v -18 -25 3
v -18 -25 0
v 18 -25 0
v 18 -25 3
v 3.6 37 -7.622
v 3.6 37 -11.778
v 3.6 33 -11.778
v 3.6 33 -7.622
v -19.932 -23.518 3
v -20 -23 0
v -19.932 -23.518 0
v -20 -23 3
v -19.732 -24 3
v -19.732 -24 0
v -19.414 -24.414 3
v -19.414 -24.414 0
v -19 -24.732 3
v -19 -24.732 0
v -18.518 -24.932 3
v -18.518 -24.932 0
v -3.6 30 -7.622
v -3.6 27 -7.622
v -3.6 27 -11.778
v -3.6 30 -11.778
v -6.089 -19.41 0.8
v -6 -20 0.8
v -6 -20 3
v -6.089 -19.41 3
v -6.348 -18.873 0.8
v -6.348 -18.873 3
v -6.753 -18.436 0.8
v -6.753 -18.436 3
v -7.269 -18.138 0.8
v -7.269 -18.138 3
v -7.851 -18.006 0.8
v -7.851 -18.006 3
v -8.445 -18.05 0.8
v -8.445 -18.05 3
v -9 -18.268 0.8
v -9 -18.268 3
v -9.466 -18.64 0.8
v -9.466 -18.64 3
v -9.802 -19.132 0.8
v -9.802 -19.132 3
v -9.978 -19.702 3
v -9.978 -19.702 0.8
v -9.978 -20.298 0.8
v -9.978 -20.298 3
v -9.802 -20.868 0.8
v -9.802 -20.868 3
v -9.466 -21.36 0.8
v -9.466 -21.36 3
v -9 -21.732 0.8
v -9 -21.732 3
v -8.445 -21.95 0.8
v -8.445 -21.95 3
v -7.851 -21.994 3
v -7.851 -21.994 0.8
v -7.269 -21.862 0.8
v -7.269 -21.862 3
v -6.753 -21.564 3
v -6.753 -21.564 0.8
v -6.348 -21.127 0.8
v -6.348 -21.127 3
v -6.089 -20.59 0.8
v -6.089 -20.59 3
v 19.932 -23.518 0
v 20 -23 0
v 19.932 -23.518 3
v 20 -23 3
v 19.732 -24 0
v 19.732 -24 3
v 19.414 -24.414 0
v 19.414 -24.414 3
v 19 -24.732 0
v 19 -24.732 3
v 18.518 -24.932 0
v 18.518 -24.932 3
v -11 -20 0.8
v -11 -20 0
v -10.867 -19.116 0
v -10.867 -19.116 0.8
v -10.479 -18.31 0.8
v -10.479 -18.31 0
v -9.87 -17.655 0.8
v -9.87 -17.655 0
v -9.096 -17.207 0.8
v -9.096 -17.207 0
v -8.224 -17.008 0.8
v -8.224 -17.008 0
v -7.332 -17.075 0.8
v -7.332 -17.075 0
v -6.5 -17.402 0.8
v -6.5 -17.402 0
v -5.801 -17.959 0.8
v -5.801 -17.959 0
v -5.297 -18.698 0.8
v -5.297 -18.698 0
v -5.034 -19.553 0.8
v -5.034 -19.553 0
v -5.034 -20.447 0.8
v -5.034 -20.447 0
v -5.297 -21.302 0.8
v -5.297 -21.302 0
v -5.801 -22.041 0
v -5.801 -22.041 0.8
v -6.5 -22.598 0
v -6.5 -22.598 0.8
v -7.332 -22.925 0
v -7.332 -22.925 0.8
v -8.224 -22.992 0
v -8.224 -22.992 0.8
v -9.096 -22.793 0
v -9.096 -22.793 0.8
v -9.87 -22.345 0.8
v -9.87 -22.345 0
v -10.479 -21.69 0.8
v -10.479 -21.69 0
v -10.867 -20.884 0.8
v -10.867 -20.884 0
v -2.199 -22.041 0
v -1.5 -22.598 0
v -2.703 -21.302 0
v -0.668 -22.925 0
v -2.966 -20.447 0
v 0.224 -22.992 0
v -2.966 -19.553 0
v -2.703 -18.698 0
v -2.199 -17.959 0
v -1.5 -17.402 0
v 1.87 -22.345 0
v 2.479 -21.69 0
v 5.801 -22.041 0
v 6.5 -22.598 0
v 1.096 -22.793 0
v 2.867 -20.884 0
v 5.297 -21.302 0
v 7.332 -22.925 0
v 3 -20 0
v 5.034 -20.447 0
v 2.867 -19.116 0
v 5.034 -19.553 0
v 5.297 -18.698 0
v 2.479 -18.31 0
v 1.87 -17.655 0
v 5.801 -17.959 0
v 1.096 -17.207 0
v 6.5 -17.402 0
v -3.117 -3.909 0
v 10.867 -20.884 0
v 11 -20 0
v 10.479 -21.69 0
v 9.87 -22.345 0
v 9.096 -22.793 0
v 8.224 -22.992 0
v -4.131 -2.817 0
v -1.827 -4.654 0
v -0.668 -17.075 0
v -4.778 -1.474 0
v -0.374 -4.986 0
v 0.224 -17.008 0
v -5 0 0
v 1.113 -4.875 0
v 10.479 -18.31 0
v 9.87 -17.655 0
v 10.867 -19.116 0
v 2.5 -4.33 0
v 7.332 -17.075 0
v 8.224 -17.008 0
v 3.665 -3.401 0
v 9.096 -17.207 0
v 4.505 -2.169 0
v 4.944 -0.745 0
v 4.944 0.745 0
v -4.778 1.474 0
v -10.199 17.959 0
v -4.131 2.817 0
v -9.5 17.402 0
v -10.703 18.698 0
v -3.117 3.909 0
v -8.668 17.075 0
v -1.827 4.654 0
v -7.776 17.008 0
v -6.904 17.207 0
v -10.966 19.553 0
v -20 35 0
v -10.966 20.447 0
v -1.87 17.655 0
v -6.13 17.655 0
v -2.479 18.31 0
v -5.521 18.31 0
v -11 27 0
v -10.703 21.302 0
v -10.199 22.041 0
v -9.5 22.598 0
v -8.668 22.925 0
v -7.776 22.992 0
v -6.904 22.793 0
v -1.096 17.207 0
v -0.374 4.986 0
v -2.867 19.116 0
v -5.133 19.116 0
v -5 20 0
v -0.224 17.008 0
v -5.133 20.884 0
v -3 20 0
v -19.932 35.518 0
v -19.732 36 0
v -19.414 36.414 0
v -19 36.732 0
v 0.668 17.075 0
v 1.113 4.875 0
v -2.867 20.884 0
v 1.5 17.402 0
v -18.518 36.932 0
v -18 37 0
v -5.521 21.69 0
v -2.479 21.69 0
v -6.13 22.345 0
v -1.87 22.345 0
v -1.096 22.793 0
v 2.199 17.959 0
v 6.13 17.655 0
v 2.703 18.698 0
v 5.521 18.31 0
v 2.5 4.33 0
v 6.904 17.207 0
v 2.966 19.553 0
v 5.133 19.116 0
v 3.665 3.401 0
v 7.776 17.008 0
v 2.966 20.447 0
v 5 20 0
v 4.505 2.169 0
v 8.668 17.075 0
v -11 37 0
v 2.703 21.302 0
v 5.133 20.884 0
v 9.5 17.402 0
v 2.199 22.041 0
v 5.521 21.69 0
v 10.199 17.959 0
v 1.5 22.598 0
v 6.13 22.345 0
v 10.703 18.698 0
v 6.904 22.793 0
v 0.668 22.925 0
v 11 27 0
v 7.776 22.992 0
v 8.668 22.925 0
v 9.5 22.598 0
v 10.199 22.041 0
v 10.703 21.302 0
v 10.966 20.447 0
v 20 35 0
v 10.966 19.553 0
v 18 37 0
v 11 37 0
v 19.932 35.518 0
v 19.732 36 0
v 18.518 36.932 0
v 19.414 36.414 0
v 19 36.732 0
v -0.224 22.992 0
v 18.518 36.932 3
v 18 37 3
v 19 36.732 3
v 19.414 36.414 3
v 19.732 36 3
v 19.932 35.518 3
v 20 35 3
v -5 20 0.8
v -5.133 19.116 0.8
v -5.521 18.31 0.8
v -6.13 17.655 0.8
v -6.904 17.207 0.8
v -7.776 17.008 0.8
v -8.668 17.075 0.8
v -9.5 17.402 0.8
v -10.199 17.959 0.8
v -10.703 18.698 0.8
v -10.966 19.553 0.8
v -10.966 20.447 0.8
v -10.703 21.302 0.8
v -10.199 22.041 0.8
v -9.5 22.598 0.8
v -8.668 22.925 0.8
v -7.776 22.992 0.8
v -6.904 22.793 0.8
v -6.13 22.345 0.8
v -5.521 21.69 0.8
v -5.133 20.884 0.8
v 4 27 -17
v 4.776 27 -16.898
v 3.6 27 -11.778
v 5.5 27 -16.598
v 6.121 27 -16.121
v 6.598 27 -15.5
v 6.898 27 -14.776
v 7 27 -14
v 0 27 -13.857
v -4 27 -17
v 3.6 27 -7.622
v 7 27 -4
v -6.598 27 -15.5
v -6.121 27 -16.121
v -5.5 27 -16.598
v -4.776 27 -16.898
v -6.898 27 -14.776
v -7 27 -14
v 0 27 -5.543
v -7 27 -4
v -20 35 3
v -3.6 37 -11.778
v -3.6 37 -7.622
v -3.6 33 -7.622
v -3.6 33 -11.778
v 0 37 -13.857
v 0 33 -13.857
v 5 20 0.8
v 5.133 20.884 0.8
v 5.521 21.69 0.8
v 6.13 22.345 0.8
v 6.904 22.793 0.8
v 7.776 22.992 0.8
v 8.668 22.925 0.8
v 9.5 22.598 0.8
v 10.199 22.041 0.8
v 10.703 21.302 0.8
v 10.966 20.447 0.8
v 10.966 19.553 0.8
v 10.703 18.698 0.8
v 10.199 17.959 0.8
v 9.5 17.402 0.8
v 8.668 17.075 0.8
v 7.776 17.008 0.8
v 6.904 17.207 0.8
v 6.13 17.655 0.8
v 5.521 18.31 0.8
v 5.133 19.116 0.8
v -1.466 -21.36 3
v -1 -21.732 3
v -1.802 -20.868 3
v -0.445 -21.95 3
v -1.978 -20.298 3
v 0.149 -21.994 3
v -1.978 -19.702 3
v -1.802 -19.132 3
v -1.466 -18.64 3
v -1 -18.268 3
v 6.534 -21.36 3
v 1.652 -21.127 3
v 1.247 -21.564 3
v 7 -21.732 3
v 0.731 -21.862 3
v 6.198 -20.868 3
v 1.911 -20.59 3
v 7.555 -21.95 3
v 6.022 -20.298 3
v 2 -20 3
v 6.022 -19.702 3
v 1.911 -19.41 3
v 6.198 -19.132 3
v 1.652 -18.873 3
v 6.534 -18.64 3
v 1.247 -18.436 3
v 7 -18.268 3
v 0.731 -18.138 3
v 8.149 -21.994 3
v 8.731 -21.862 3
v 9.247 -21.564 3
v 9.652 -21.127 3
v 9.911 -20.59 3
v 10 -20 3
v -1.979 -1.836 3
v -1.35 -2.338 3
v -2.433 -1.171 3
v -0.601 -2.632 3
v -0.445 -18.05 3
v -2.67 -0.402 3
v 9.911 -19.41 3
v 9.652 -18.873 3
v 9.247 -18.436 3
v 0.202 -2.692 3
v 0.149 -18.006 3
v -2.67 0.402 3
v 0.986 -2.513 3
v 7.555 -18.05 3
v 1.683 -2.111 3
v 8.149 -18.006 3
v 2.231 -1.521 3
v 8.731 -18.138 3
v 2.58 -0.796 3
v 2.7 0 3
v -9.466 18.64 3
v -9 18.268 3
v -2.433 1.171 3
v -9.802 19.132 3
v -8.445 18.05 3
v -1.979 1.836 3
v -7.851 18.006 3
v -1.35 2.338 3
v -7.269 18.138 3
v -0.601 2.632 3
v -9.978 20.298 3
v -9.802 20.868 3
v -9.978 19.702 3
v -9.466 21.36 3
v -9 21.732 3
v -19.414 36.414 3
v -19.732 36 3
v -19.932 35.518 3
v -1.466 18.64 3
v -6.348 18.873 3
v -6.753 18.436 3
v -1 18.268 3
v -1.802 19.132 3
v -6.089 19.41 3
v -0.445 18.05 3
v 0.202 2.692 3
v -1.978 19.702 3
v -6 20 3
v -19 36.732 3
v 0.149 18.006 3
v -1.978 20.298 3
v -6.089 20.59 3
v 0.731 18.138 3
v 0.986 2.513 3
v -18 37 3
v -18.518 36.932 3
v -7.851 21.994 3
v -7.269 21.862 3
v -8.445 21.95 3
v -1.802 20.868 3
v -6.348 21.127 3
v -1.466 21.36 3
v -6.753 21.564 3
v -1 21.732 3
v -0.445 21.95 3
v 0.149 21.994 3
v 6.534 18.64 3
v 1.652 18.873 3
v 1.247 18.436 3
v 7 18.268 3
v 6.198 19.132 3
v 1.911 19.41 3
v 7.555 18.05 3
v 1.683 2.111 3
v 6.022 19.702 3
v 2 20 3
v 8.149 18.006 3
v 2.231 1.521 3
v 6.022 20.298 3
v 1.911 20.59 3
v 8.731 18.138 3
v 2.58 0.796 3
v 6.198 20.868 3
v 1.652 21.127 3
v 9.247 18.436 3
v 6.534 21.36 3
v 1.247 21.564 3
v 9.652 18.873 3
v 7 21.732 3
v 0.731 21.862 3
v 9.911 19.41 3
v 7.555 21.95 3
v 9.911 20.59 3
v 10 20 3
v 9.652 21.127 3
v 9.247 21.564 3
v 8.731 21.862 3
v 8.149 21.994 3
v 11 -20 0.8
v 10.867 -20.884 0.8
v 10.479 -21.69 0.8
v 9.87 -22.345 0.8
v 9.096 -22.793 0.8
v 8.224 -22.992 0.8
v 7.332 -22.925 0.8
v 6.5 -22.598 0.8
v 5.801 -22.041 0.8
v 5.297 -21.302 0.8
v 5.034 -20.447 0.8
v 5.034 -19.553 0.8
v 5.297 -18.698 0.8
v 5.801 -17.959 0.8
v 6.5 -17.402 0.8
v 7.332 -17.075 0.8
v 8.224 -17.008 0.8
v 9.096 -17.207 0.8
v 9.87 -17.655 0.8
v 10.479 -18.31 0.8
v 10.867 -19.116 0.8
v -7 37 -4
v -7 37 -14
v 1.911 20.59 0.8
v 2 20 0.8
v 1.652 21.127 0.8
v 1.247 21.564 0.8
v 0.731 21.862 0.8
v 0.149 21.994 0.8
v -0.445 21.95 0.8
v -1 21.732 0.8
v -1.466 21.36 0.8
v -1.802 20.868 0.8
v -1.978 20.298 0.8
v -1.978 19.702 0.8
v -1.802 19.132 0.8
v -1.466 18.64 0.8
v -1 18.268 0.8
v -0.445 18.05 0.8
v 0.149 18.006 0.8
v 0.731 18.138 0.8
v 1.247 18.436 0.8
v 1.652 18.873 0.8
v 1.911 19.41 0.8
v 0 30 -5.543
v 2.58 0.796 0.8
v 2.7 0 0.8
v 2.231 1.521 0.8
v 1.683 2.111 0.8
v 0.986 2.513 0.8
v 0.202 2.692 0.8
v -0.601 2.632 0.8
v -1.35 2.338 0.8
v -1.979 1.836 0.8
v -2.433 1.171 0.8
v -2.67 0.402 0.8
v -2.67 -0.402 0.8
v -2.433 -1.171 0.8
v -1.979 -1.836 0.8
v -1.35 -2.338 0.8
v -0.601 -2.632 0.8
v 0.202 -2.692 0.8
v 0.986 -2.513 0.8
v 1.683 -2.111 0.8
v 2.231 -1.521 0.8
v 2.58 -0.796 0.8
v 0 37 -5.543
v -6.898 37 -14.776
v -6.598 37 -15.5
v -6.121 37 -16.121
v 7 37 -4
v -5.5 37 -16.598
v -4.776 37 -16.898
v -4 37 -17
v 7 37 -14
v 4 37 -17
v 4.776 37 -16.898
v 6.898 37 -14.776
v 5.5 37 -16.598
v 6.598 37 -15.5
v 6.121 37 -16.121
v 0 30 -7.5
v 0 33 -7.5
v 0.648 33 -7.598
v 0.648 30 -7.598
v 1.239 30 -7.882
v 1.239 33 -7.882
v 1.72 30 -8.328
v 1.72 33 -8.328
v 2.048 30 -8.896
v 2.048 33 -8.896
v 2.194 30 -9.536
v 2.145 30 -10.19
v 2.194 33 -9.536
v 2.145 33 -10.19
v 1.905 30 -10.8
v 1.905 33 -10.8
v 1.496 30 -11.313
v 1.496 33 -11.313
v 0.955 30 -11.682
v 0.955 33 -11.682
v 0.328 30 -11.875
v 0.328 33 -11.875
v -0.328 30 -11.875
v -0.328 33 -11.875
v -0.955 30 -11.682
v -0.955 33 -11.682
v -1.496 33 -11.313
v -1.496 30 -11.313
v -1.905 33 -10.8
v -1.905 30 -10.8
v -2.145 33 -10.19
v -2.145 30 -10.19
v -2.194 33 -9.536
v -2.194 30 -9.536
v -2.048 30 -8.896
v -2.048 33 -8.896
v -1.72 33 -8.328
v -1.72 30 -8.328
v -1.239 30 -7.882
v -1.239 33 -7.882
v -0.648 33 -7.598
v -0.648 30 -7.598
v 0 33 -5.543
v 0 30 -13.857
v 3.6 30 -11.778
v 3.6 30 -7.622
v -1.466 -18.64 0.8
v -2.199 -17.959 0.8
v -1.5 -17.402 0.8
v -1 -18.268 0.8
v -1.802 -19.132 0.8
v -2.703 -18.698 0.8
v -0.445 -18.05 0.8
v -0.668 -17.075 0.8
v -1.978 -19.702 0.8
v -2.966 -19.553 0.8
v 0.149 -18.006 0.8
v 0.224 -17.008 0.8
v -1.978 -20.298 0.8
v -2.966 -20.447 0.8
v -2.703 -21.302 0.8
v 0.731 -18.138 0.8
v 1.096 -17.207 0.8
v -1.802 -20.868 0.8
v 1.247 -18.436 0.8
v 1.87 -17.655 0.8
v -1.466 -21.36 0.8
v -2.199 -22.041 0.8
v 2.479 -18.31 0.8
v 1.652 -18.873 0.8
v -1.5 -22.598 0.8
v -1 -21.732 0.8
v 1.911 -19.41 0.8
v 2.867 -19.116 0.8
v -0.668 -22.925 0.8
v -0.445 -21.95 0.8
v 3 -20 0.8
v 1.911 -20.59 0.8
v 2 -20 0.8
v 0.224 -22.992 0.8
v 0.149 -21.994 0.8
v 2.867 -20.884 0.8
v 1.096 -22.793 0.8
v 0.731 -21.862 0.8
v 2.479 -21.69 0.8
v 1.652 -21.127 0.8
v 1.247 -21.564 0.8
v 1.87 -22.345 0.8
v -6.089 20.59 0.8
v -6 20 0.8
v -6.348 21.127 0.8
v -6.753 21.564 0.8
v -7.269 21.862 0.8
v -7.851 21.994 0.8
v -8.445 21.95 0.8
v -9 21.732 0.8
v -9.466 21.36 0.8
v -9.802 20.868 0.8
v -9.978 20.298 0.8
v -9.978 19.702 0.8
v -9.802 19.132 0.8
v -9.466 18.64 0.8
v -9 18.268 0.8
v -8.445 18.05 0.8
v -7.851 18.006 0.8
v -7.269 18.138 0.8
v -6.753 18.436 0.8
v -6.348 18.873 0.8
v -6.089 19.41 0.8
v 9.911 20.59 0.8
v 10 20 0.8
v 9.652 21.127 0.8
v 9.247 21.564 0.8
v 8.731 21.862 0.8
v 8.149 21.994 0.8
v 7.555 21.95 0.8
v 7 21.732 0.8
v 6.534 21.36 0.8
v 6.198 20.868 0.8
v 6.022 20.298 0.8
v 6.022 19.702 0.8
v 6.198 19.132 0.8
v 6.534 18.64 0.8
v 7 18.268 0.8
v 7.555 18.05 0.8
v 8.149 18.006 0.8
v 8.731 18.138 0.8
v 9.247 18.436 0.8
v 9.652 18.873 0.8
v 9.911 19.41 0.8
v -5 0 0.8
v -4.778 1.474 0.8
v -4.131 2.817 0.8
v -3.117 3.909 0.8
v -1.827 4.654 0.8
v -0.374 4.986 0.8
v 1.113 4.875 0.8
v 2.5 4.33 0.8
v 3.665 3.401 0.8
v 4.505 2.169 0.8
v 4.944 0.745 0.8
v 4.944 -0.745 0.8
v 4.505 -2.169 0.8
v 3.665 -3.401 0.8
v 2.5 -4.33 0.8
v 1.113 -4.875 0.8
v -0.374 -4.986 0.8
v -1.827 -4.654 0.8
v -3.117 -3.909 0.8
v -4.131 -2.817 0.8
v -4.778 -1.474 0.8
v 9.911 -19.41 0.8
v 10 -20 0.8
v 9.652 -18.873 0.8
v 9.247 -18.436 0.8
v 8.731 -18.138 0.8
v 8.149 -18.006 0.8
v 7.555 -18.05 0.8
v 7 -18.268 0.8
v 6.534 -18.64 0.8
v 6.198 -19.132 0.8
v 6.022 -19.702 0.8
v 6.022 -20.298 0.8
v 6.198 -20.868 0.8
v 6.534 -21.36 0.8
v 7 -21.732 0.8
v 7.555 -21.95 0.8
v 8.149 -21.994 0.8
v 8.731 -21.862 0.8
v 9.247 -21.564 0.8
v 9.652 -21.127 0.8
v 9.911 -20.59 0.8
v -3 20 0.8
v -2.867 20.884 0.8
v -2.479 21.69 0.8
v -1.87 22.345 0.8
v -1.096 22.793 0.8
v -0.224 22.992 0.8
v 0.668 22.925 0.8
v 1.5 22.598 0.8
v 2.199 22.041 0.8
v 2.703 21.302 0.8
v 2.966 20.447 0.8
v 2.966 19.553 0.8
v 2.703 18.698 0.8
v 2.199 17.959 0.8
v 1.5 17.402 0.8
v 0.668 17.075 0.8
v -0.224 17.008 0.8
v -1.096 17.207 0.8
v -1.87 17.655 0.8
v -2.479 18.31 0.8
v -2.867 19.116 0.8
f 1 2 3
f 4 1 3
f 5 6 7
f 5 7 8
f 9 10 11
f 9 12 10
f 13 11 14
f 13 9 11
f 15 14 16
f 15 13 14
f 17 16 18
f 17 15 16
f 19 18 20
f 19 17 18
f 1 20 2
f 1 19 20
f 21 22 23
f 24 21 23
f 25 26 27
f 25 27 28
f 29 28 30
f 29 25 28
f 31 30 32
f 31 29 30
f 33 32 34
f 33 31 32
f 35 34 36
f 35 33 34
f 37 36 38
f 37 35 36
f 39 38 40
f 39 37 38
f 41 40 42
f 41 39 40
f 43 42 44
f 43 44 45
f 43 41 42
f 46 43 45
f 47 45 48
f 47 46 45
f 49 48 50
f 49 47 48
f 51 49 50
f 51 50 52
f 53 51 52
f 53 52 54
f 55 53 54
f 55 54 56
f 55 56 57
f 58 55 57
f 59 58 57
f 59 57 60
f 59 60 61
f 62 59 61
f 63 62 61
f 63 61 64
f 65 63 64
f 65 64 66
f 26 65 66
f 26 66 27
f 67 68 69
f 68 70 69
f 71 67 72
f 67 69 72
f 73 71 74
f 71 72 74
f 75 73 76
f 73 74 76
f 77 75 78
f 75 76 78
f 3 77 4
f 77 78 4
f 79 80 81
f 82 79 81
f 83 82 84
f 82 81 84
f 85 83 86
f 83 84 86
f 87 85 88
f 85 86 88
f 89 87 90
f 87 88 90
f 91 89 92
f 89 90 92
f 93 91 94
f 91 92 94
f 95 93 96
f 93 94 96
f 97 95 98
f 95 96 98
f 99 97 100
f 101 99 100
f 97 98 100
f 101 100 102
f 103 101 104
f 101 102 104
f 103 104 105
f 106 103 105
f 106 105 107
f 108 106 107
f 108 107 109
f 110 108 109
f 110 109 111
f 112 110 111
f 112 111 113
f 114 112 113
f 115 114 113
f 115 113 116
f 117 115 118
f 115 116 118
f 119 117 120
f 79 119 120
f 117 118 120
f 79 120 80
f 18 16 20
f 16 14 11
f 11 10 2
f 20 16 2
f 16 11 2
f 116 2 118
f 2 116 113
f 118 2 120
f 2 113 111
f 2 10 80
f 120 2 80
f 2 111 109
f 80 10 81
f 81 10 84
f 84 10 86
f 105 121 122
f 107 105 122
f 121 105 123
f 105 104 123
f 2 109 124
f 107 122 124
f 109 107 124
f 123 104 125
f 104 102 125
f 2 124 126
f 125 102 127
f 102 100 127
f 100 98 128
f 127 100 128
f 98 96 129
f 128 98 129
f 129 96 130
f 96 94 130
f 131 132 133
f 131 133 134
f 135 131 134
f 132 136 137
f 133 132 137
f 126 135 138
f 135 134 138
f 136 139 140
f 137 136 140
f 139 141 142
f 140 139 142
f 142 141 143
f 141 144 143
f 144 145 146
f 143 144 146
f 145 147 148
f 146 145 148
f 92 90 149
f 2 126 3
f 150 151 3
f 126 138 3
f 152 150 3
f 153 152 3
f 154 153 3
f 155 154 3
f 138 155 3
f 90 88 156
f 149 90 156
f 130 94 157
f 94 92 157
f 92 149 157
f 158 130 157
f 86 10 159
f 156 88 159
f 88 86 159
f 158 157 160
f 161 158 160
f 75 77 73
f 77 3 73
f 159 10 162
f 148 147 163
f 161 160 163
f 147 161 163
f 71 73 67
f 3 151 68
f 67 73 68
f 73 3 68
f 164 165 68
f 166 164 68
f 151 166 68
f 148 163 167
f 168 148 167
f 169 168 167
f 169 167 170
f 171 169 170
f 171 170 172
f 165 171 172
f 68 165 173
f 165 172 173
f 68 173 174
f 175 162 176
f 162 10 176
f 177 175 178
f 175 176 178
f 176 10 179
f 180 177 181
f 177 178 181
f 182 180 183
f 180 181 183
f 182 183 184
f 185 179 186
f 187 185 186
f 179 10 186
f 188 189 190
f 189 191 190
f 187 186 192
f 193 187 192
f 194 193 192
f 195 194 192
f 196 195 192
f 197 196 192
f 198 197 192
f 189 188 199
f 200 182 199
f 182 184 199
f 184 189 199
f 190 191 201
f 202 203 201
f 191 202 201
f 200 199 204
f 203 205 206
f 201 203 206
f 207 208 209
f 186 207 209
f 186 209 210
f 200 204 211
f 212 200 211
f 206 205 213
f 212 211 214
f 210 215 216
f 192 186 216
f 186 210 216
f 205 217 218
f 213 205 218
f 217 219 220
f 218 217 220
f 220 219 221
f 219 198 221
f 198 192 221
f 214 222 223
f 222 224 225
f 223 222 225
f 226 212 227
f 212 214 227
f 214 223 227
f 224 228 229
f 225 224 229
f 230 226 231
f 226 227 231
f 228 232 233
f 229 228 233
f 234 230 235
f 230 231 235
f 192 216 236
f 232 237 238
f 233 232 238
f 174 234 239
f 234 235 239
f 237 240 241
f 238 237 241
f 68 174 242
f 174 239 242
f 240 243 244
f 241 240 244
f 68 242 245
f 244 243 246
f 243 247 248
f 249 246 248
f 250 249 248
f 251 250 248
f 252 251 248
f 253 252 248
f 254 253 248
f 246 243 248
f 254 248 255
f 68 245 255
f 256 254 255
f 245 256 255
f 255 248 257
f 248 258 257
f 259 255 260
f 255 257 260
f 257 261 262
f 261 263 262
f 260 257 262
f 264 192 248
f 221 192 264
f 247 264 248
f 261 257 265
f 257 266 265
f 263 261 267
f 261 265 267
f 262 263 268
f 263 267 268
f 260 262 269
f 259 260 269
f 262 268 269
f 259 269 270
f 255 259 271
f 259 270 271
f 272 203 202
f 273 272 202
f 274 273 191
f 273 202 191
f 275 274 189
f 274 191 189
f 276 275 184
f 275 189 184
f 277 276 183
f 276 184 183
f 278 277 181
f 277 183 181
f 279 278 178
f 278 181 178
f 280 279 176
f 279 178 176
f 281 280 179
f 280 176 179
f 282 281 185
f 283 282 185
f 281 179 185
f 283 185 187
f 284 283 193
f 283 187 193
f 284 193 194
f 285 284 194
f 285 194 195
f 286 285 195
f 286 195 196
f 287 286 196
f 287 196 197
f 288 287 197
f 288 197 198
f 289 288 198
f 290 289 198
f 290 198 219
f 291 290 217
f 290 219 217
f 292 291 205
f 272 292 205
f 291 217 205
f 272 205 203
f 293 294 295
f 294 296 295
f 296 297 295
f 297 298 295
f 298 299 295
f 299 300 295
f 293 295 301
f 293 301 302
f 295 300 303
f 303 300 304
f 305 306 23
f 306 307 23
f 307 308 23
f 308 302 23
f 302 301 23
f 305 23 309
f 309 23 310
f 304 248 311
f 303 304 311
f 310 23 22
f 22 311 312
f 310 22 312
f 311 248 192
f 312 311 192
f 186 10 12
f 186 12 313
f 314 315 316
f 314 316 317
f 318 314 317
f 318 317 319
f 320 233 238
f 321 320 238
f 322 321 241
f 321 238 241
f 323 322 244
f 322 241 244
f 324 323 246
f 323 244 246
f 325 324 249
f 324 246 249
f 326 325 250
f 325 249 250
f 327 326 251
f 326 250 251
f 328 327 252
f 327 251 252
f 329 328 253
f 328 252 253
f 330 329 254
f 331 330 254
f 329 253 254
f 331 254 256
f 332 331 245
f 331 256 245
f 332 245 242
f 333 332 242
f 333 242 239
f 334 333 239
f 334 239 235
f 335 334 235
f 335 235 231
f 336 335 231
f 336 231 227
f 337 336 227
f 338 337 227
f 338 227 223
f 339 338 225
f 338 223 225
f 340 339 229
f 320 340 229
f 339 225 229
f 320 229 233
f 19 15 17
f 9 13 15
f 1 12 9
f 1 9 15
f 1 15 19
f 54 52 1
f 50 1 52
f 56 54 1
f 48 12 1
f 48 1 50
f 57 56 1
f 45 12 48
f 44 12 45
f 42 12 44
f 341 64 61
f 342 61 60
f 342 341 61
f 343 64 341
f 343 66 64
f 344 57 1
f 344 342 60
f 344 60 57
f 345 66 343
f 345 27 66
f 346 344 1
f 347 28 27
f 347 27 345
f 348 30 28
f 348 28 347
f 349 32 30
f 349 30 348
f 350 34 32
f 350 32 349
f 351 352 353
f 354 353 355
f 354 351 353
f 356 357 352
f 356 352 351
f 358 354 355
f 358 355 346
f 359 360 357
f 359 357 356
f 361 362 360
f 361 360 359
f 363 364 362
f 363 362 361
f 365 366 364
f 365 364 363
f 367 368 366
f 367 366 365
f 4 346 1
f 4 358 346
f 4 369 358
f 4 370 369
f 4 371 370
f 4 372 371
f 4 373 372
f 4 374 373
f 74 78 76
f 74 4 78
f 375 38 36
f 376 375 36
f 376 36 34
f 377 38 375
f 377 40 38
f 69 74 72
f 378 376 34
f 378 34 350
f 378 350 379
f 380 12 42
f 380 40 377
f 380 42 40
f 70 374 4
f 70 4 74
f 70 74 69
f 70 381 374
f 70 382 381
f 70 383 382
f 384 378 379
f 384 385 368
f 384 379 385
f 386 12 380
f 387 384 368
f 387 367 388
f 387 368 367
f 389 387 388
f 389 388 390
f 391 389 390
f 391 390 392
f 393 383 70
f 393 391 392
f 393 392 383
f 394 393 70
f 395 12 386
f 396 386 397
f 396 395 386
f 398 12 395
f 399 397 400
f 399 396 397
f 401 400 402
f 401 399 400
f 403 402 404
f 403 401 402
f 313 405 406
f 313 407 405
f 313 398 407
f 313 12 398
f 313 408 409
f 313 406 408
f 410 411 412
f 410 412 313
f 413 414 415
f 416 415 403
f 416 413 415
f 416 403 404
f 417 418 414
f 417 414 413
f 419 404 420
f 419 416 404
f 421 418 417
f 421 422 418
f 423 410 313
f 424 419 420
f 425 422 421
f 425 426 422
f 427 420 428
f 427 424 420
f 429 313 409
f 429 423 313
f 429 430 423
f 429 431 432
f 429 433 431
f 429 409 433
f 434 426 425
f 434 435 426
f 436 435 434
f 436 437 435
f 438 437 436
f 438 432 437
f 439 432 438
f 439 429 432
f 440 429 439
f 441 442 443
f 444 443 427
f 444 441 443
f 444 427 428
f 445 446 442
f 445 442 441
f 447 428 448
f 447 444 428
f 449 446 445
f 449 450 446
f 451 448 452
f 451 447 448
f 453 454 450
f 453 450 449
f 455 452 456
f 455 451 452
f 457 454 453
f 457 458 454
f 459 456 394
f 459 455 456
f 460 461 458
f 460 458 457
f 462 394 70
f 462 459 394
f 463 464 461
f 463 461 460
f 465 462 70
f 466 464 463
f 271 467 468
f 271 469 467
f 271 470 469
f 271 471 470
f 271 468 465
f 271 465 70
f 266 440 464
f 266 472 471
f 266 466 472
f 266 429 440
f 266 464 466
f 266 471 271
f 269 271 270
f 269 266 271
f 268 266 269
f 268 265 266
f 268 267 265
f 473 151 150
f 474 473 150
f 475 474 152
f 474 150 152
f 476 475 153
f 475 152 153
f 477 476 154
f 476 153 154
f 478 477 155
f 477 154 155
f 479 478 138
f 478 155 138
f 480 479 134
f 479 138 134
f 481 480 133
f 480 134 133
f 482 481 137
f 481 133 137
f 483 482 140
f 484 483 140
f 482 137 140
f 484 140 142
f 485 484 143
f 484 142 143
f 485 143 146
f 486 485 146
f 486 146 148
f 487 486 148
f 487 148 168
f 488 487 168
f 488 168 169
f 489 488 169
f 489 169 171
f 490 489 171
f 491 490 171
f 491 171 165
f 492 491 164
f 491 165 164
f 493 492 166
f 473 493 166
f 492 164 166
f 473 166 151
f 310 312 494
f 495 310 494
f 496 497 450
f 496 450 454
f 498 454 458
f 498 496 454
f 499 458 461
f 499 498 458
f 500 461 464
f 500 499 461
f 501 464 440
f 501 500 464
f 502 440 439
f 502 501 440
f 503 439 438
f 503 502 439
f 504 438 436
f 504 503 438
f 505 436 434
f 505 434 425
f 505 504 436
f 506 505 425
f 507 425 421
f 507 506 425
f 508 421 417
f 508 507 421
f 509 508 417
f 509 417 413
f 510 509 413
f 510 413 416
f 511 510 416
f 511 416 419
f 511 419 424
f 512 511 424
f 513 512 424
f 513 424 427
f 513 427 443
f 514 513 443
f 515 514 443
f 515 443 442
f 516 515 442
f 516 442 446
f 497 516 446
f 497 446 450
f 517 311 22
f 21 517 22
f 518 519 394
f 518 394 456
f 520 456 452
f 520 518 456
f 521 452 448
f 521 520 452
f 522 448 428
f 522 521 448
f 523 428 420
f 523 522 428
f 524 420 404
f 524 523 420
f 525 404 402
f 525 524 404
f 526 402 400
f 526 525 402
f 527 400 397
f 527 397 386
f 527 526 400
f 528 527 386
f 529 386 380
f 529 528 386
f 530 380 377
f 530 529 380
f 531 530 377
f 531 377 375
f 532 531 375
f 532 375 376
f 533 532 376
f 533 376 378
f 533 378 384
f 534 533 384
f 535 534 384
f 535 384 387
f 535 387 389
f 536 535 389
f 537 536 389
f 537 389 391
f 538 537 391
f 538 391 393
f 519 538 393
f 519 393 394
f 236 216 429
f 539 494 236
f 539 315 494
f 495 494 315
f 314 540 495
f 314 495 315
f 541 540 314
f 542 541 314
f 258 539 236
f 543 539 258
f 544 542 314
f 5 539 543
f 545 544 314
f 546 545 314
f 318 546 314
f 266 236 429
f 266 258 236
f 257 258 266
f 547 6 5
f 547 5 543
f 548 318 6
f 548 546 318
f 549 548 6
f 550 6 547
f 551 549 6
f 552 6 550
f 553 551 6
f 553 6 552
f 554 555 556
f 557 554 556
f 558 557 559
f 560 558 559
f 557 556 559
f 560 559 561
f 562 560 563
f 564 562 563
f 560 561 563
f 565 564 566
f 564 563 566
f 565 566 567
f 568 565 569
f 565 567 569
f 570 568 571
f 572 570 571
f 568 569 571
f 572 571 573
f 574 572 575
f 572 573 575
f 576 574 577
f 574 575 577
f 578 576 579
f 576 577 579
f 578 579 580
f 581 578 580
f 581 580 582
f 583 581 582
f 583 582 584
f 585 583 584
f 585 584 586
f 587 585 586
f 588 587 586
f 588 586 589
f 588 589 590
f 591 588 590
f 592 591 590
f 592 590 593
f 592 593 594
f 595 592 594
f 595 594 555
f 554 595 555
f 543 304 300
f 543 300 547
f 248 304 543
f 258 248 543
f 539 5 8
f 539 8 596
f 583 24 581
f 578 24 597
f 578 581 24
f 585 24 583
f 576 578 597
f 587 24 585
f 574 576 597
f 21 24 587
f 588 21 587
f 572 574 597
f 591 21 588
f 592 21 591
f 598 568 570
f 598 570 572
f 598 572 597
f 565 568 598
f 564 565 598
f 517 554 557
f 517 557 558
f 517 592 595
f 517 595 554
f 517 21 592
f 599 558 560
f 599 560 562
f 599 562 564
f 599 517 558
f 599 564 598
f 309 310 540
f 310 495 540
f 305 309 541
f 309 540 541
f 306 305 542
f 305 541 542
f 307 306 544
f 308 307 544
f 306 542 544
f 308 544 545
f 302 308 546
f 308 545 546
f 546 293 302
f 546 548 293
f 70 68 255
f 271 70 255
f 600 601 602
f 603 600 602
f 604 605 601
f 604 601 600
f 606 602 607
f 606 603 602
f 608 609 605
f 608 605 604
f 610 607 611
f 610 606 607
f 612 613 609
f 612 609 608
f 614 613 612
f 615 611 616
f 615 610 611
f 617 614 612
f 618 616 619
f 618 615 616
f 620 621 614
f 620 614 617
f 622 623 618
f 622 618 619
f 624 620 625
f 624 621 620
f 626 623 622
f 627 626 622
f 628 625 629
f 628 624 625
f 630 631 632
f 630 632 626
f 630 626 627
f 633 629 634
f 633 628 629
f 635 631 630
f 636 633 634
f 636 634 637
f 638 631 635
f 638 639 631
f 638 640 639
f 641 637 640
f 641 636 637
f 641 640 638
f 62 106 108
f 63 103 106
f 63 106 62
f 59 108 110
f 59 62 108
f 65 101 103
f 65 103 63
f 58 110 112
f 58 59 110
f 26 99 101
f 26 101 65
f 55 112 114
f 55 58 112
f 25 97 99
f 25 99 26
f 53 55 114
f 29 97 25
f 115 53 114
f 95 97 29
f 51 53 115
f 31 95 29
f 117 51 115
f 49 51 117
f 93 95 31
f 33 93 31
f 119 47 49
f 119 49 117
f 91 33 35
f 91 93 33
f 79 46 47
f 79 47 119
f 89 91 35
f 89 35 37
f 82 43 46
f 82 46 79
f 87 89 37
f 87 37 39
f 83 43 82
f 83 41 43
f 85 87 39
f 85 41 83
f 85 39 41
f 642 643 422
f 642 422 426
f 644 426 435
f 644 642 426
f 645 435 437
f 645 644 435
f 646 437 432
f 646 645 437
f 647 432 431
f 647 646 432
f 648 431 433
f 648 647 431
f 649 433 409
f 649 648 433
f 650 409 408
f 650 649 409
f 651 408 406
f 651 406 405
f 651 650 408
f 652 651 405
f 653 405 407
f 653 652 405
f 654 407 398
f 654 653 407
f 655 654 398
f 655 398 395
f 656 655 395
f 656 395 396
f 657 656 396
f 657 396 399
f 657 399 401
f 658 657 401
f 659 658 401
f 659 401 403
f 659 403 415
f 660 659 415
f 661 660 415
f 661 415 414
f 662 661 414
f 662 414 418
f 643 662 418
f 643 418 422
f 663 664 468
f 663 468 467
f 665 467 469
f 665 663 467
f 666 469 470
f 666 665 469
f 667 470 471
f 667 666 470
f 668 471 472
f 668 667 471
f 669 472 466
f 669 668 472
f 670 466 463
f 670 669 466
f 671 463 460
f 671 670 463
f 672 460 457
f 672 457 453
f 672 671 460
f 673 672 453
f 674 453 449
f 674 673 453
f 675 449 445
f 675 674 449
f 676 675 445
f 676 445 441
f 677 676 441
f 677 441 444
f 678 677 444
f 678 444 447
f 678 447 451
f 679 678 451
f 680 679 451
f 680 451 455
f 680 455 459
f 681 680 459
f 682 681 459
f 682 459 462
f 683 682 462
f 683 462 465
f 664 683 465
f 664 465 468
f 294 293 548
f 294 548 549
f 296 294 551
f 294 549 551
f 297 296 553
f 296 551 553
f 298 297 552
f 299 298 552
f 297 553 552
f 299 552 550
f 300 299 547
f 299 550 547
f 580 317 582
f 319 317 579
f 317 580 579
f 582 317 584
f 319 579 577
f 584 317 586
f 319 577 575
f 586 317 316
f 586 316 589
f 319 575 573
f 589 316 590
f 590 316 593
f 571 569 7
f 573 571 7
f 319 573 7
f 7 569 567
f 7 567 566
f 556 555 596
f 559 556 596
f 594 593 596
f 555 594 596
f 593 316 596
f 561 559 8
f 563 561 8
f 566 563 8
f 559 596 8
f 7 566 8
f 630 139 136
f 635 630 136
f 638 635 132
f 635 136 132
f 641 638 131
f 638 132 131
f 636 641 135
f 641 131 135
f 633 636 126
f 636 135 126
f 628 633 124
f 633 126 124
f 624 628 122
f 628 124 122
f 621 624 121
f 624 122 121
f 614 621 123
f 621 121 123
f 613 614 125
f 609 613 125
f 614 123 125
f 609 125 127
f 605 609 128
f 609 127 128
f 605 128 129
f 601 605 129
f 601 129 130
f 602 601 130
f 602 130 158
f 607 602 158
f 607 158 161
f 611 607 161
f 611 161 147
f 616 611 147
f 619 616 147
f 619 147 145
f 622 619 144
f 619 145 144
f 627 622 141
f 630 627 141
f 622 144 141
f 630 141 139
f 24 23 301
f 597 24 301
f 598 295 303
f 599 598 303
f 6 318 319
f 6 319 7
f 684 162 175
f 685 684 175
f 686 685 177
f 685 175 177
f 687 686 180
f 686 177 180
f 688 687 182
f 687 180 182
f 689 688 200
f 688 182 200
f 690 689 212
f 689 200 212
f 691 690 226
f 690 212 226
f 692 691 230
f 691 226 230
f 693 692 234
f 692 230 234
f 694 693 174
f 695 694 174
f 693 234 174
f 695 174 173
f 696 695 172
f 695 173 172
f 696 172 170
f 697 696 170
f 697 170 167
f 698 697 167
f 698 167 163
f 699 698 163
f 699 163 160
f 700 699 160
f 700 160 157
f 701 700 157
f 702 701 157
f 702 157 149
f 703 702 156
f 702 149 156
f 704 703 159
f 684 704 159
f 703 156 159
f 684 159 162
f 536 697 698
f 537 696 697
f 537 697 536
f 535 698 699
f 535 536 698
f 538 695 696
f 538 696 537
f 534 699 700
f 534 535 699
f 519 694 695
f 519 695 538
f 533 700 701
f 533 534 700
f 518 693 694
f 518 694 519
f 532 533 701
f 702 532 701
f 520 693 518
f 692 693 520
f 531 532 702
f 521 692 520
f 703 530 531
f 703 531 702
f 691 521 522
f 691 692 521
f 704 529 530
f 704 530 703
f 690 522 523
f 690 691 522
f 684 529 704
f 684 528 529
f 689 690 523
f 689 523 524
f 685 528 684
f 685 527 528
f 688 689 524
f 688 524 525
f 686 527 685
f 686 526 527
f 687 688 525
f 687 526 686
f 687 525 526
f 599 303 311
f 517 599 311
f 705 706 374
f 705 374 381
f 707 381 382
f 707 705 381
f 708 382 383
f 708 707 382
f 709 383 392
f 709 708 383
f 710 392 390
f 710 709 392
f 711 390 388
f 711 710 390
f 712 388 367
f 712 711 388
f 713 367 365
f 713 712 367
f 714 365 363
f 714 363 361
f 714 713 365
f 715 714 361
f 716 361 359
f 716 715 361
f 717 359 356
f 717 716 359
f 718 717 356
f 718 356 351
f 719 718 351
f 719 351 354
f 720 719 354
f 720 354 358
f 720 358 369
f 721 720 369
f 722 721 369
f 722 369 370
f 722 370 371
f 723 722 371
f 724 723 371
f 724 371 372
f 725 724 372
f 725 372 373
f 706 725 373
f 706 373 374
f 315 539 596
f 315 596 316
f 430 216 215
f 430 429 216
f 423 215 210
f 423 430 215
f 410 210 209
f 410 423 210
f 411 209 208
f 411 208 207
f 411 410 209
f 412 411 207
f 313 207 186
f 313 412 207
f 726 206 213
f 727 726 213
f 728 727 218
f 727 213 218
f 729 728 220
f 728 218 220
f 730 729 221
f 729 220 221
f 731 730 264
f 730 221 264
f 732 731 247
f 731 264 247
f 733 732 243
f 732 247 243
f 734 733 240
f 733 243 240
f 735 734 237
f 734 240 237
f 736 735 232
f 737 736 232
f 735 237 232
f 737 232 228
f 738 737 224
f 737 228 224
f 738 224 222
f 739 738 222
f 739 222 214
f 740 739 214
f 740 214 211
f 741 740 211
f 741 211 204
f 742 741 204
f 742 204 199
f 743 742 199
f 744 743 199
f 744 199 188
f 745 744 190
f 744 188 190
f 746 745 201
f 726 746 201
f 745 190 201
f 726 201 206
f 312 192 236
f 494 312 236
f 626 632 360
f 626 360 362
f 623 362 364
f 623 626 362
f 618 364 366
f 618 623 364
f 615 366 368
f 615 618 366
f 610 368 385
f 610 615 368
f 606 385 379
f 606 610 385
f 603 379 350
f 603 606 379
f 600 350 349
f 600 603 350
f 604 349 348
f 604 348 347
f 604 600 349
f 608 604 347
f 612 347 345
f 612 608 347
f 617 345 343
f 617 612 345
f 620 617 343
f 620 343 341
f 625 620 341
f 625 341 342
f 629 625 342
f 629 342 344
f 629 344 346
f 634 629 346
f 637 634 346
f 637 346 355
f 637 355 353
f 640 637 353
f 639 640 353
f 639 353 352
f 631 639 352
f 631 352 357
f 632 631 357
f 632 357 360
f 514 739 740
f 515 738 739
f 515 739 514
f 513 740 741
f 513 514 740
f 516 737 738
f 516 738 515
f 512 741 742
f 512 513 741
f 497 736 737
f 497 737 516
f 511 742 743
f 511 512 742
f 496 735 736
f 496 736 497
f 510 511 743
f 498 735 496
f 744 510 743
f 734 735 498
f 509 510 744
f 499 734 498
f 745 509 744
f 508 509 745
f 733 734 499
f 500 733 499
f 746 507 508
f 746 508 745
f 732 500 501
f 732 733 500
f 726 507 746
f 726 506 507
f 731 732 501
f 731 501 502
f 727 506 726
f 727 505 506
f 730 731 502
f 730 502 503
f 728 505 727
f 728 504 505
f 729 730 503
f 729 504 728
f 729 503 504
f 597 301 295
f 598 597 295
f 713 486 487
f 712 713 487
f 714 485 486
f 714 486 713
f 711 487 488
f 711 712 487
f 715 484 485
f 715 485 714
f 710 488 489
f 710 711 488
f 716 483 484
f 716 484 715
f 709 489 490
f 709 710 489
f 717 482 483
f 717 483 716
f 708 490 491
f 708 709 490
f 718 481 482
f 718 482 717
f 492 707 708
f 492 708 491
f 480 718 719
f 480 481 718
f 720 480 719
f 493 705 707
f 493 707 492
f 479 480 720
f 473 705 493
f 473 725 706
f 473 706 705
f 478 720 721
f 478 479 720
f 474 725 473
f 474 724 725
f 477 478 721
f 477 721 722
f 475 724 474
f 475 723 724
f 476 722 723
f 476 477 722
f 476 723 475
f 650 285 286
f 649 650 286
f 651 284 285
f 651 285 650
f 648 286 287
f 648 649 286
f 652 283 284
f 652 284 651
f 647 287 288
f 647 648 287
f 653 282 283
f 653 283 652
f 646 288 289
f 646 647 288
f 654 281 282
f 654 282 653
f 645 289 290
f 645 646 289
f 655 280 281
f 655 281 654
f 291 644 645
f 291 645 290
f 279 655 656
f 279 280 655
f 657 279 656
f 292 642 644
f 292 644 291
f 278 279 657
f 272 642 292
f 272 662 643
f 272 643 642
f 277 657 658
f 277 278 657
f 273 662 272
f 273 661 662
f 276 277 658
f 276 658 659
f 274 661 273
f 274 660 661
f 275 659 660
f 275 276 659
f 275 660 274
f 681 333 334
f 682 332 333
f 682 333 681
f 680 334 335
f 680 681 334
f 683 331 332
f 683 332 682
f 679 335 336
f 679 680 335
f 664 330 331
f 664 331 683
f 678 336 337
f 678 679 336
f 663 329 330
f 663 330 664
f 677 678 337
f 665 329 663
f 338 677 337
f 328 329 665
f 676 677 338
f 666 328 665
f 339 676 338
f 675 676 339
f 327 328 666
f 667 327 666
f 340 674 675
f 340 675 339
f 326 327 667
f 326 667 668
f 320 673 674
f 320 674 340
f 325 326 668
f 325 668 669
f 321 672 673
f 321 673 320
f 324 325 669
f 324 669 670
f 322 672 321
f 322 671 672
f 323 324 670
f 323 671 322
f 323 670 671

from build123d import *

# Parameters (mm, degrees)
SKETCH_1_W          = 40
SKETCH_1_H          = 62
SKETCH_1_R          = 2
SKETCH_1_R_2        = 2.7
EXTRUDE_1_DEPTH     = 3
SKETCH_3_W          = 14
SKETCH_3_H          = 10
EXTRUDE_2_DEPTH     = 17
CUT_EXTRUDE_START   = -10
CUT_EXTRUDE_1_DEPTH = 4
CUT_EXTRUDE_2_REACH = 65.663
SKETCH_6_R          = 2.2
FILLET_1_R          = 3
CHAMFER_1_SIZE      = 4
CUT_EXTRUDE_3_DEPTH = 3
FILLET_2_R          = 2
SKETCH_7_R          = 5
SKETCH_7_R_2        = 3
CUT_EXTRUDE_4_DEPTH = 0.8


with BuildPart() as part:
    # 草图1 → 凸台-拉伸1 (new body)
    with BuildSketch(Plane.XY):
        with Locations((0, 6)):
            Rectangle(SKETCH_1_W, SKETCH_1_H)
        with Locations((0, 20)):
            Circle(SKETCH_1_R, mode=Mode.SUBTRACT)
        with Locations((8, 20)):
            Circle(SKETCH_1_R, mode=Mode.SUBTRACT)
        with Locations((-8, -20)):
            Circle(SKETCH_1_R, mode=Mode.SUBTRACT)
        with Locations((0, -20)):
            Circle(SKETCH_1_R, mode=Mode.SUBTRACT)
        with Locations((8, -20)):
            Circle(SKETCH_1_R, mode=Mode.SUBTRACT)
        with Locations((-8, 20)):
            Circle(SKETCH_1_R, mode=Mode.SUBTRACT)
        Circle(SKETCH_1_R_2, mode=Mode.SUBTRACT)
    extrude(amount=EXTRUDE_1_DEPTH)

    # 草图3 → 凸台-拉伸2 (add)
    with BuildSketch(Plane(origin=(0, 0, 0), x_dir=(-1, 0, 0), z_dir=(0, 0, -1))):
        with Locations((0, 32)):
            Rectangle(SKETCH_3_W, SKETCH_3_H)
    extrude(amount=EXTRUDE_2_DEPTH)

    # 草图5 → 切除-拉伸1 (cut)
    with BuildSketch(Plane.XZ.offset(-27).offset(CUT_EXTRUDE_START)):
        Polygon((3.6, -11.778460969), (3.6, -7.621539031), (0, -5.543078062), (-3.6, -7.621539031), (-3.6, -11.778460969), (0, -13.856921938), align=None)
    extrude(amount=CUT_EXTRUDE_1_DEPTH, mode=Mode.SUBTRACT)

    # 草图6 → 切除-拉伸2 (cut, up to next)
    with BuildSketch(Plane(origin=(0, 33, 0), x_dir=(-1, 0, 0), z_dir=(0, 1, 0)), mode=Mode.PRIVATE) as cut_extrude_2_sk1:
        with Locations(Location((0, -9.7, 0), (0, 0, 90))):
            Circle(SKETCH_6_R)
    cut_extrude_2_tool1 = extrude(cut_extrude_2_sk1.sketch, amount=-CUT_EXTRUDE_2_REACH, mode=Mode.PRIVATE) & part.part
    add(cut_extrude_2_tool1.solids().sort_by_distance((0, 33, -9.7))[0], mode=Mode.SUBTRACT)

    # 圆角1
    fillet_1_edges = [part.edges().sort_by_distance(p)[0] for p in [
        (-7, 32, -17),
        (7, 32, -17),
    ]]
    fillet(fillet_1_edges, radius=FILLET_1_R)

    # 倒角1
    chamfer_1_edges = [part.edges().sort_by_distance(p)[0] for p in [
        (-7, 32, 0),
        (7, 32, 0),
    ]]
    chamfer(chamfer_1_edges, length=CHAMFER_1_SIZE)

    # 草图5<2> → 切除-拉伸3 (cut)
    with BuildSketch(Plane.XZ.offset(-27)):
        Polygon((3.6, -11.778460969), (3.6, -7.621539031), (0, -5.543078062), (-3.6, -7.621539031), (-3.6, -11.778460969), (0, -13.856921938), align=None)
    extrude(amount=-CUT_EXTRUDE_3_DEPTH, mode=Mode.SUBTRACT)

    # 圆角2
    fillet_2_edges = [part.edges().sort_by_distance(p)[0] for p in [
        (-20, 37, 1.5),
        (20, 37, 1.5),
        (20, -25, 1.5),
        (-20, -25, 1.5),
    ]]
    fillet(fillet_2_edges, radius=FILLET_2_R)

    # 草图7 → 切除-拉伸4 (cut)
    with BuildSketch(Plane(origin=(0, 0, 0), x_dir=(-1, 0, 0), z_dir=(0, 0, -1))):
        Circle(SKETCH_7_R)
        with Locations((-8, 20)):
            Circle(SKETCH_7_R_2)
        with Locations((0, 20)):
            Circle(SKETCH_7_R_2)
        with Locations(Location((8, 20, 0), (0, 0, 180))):
            Circle(SKETCH_7_R_2)
        with Locations((8, -20)):
            Circle(SKETCH_7_R_2)
        with Locations(Location((0, -20, 0), (0, 0, 180))):
            Circle(SKETCH_7_R_2)
        with Locations(Location((-8, -20, 0), (0, 0, 180))):
            Circle(SKETCH_7_R_2)
    extrude(amount=-CUT_EXTRUDE_4_DEPTH, mode=Mode.SUBTRACT)


solid = part.part
